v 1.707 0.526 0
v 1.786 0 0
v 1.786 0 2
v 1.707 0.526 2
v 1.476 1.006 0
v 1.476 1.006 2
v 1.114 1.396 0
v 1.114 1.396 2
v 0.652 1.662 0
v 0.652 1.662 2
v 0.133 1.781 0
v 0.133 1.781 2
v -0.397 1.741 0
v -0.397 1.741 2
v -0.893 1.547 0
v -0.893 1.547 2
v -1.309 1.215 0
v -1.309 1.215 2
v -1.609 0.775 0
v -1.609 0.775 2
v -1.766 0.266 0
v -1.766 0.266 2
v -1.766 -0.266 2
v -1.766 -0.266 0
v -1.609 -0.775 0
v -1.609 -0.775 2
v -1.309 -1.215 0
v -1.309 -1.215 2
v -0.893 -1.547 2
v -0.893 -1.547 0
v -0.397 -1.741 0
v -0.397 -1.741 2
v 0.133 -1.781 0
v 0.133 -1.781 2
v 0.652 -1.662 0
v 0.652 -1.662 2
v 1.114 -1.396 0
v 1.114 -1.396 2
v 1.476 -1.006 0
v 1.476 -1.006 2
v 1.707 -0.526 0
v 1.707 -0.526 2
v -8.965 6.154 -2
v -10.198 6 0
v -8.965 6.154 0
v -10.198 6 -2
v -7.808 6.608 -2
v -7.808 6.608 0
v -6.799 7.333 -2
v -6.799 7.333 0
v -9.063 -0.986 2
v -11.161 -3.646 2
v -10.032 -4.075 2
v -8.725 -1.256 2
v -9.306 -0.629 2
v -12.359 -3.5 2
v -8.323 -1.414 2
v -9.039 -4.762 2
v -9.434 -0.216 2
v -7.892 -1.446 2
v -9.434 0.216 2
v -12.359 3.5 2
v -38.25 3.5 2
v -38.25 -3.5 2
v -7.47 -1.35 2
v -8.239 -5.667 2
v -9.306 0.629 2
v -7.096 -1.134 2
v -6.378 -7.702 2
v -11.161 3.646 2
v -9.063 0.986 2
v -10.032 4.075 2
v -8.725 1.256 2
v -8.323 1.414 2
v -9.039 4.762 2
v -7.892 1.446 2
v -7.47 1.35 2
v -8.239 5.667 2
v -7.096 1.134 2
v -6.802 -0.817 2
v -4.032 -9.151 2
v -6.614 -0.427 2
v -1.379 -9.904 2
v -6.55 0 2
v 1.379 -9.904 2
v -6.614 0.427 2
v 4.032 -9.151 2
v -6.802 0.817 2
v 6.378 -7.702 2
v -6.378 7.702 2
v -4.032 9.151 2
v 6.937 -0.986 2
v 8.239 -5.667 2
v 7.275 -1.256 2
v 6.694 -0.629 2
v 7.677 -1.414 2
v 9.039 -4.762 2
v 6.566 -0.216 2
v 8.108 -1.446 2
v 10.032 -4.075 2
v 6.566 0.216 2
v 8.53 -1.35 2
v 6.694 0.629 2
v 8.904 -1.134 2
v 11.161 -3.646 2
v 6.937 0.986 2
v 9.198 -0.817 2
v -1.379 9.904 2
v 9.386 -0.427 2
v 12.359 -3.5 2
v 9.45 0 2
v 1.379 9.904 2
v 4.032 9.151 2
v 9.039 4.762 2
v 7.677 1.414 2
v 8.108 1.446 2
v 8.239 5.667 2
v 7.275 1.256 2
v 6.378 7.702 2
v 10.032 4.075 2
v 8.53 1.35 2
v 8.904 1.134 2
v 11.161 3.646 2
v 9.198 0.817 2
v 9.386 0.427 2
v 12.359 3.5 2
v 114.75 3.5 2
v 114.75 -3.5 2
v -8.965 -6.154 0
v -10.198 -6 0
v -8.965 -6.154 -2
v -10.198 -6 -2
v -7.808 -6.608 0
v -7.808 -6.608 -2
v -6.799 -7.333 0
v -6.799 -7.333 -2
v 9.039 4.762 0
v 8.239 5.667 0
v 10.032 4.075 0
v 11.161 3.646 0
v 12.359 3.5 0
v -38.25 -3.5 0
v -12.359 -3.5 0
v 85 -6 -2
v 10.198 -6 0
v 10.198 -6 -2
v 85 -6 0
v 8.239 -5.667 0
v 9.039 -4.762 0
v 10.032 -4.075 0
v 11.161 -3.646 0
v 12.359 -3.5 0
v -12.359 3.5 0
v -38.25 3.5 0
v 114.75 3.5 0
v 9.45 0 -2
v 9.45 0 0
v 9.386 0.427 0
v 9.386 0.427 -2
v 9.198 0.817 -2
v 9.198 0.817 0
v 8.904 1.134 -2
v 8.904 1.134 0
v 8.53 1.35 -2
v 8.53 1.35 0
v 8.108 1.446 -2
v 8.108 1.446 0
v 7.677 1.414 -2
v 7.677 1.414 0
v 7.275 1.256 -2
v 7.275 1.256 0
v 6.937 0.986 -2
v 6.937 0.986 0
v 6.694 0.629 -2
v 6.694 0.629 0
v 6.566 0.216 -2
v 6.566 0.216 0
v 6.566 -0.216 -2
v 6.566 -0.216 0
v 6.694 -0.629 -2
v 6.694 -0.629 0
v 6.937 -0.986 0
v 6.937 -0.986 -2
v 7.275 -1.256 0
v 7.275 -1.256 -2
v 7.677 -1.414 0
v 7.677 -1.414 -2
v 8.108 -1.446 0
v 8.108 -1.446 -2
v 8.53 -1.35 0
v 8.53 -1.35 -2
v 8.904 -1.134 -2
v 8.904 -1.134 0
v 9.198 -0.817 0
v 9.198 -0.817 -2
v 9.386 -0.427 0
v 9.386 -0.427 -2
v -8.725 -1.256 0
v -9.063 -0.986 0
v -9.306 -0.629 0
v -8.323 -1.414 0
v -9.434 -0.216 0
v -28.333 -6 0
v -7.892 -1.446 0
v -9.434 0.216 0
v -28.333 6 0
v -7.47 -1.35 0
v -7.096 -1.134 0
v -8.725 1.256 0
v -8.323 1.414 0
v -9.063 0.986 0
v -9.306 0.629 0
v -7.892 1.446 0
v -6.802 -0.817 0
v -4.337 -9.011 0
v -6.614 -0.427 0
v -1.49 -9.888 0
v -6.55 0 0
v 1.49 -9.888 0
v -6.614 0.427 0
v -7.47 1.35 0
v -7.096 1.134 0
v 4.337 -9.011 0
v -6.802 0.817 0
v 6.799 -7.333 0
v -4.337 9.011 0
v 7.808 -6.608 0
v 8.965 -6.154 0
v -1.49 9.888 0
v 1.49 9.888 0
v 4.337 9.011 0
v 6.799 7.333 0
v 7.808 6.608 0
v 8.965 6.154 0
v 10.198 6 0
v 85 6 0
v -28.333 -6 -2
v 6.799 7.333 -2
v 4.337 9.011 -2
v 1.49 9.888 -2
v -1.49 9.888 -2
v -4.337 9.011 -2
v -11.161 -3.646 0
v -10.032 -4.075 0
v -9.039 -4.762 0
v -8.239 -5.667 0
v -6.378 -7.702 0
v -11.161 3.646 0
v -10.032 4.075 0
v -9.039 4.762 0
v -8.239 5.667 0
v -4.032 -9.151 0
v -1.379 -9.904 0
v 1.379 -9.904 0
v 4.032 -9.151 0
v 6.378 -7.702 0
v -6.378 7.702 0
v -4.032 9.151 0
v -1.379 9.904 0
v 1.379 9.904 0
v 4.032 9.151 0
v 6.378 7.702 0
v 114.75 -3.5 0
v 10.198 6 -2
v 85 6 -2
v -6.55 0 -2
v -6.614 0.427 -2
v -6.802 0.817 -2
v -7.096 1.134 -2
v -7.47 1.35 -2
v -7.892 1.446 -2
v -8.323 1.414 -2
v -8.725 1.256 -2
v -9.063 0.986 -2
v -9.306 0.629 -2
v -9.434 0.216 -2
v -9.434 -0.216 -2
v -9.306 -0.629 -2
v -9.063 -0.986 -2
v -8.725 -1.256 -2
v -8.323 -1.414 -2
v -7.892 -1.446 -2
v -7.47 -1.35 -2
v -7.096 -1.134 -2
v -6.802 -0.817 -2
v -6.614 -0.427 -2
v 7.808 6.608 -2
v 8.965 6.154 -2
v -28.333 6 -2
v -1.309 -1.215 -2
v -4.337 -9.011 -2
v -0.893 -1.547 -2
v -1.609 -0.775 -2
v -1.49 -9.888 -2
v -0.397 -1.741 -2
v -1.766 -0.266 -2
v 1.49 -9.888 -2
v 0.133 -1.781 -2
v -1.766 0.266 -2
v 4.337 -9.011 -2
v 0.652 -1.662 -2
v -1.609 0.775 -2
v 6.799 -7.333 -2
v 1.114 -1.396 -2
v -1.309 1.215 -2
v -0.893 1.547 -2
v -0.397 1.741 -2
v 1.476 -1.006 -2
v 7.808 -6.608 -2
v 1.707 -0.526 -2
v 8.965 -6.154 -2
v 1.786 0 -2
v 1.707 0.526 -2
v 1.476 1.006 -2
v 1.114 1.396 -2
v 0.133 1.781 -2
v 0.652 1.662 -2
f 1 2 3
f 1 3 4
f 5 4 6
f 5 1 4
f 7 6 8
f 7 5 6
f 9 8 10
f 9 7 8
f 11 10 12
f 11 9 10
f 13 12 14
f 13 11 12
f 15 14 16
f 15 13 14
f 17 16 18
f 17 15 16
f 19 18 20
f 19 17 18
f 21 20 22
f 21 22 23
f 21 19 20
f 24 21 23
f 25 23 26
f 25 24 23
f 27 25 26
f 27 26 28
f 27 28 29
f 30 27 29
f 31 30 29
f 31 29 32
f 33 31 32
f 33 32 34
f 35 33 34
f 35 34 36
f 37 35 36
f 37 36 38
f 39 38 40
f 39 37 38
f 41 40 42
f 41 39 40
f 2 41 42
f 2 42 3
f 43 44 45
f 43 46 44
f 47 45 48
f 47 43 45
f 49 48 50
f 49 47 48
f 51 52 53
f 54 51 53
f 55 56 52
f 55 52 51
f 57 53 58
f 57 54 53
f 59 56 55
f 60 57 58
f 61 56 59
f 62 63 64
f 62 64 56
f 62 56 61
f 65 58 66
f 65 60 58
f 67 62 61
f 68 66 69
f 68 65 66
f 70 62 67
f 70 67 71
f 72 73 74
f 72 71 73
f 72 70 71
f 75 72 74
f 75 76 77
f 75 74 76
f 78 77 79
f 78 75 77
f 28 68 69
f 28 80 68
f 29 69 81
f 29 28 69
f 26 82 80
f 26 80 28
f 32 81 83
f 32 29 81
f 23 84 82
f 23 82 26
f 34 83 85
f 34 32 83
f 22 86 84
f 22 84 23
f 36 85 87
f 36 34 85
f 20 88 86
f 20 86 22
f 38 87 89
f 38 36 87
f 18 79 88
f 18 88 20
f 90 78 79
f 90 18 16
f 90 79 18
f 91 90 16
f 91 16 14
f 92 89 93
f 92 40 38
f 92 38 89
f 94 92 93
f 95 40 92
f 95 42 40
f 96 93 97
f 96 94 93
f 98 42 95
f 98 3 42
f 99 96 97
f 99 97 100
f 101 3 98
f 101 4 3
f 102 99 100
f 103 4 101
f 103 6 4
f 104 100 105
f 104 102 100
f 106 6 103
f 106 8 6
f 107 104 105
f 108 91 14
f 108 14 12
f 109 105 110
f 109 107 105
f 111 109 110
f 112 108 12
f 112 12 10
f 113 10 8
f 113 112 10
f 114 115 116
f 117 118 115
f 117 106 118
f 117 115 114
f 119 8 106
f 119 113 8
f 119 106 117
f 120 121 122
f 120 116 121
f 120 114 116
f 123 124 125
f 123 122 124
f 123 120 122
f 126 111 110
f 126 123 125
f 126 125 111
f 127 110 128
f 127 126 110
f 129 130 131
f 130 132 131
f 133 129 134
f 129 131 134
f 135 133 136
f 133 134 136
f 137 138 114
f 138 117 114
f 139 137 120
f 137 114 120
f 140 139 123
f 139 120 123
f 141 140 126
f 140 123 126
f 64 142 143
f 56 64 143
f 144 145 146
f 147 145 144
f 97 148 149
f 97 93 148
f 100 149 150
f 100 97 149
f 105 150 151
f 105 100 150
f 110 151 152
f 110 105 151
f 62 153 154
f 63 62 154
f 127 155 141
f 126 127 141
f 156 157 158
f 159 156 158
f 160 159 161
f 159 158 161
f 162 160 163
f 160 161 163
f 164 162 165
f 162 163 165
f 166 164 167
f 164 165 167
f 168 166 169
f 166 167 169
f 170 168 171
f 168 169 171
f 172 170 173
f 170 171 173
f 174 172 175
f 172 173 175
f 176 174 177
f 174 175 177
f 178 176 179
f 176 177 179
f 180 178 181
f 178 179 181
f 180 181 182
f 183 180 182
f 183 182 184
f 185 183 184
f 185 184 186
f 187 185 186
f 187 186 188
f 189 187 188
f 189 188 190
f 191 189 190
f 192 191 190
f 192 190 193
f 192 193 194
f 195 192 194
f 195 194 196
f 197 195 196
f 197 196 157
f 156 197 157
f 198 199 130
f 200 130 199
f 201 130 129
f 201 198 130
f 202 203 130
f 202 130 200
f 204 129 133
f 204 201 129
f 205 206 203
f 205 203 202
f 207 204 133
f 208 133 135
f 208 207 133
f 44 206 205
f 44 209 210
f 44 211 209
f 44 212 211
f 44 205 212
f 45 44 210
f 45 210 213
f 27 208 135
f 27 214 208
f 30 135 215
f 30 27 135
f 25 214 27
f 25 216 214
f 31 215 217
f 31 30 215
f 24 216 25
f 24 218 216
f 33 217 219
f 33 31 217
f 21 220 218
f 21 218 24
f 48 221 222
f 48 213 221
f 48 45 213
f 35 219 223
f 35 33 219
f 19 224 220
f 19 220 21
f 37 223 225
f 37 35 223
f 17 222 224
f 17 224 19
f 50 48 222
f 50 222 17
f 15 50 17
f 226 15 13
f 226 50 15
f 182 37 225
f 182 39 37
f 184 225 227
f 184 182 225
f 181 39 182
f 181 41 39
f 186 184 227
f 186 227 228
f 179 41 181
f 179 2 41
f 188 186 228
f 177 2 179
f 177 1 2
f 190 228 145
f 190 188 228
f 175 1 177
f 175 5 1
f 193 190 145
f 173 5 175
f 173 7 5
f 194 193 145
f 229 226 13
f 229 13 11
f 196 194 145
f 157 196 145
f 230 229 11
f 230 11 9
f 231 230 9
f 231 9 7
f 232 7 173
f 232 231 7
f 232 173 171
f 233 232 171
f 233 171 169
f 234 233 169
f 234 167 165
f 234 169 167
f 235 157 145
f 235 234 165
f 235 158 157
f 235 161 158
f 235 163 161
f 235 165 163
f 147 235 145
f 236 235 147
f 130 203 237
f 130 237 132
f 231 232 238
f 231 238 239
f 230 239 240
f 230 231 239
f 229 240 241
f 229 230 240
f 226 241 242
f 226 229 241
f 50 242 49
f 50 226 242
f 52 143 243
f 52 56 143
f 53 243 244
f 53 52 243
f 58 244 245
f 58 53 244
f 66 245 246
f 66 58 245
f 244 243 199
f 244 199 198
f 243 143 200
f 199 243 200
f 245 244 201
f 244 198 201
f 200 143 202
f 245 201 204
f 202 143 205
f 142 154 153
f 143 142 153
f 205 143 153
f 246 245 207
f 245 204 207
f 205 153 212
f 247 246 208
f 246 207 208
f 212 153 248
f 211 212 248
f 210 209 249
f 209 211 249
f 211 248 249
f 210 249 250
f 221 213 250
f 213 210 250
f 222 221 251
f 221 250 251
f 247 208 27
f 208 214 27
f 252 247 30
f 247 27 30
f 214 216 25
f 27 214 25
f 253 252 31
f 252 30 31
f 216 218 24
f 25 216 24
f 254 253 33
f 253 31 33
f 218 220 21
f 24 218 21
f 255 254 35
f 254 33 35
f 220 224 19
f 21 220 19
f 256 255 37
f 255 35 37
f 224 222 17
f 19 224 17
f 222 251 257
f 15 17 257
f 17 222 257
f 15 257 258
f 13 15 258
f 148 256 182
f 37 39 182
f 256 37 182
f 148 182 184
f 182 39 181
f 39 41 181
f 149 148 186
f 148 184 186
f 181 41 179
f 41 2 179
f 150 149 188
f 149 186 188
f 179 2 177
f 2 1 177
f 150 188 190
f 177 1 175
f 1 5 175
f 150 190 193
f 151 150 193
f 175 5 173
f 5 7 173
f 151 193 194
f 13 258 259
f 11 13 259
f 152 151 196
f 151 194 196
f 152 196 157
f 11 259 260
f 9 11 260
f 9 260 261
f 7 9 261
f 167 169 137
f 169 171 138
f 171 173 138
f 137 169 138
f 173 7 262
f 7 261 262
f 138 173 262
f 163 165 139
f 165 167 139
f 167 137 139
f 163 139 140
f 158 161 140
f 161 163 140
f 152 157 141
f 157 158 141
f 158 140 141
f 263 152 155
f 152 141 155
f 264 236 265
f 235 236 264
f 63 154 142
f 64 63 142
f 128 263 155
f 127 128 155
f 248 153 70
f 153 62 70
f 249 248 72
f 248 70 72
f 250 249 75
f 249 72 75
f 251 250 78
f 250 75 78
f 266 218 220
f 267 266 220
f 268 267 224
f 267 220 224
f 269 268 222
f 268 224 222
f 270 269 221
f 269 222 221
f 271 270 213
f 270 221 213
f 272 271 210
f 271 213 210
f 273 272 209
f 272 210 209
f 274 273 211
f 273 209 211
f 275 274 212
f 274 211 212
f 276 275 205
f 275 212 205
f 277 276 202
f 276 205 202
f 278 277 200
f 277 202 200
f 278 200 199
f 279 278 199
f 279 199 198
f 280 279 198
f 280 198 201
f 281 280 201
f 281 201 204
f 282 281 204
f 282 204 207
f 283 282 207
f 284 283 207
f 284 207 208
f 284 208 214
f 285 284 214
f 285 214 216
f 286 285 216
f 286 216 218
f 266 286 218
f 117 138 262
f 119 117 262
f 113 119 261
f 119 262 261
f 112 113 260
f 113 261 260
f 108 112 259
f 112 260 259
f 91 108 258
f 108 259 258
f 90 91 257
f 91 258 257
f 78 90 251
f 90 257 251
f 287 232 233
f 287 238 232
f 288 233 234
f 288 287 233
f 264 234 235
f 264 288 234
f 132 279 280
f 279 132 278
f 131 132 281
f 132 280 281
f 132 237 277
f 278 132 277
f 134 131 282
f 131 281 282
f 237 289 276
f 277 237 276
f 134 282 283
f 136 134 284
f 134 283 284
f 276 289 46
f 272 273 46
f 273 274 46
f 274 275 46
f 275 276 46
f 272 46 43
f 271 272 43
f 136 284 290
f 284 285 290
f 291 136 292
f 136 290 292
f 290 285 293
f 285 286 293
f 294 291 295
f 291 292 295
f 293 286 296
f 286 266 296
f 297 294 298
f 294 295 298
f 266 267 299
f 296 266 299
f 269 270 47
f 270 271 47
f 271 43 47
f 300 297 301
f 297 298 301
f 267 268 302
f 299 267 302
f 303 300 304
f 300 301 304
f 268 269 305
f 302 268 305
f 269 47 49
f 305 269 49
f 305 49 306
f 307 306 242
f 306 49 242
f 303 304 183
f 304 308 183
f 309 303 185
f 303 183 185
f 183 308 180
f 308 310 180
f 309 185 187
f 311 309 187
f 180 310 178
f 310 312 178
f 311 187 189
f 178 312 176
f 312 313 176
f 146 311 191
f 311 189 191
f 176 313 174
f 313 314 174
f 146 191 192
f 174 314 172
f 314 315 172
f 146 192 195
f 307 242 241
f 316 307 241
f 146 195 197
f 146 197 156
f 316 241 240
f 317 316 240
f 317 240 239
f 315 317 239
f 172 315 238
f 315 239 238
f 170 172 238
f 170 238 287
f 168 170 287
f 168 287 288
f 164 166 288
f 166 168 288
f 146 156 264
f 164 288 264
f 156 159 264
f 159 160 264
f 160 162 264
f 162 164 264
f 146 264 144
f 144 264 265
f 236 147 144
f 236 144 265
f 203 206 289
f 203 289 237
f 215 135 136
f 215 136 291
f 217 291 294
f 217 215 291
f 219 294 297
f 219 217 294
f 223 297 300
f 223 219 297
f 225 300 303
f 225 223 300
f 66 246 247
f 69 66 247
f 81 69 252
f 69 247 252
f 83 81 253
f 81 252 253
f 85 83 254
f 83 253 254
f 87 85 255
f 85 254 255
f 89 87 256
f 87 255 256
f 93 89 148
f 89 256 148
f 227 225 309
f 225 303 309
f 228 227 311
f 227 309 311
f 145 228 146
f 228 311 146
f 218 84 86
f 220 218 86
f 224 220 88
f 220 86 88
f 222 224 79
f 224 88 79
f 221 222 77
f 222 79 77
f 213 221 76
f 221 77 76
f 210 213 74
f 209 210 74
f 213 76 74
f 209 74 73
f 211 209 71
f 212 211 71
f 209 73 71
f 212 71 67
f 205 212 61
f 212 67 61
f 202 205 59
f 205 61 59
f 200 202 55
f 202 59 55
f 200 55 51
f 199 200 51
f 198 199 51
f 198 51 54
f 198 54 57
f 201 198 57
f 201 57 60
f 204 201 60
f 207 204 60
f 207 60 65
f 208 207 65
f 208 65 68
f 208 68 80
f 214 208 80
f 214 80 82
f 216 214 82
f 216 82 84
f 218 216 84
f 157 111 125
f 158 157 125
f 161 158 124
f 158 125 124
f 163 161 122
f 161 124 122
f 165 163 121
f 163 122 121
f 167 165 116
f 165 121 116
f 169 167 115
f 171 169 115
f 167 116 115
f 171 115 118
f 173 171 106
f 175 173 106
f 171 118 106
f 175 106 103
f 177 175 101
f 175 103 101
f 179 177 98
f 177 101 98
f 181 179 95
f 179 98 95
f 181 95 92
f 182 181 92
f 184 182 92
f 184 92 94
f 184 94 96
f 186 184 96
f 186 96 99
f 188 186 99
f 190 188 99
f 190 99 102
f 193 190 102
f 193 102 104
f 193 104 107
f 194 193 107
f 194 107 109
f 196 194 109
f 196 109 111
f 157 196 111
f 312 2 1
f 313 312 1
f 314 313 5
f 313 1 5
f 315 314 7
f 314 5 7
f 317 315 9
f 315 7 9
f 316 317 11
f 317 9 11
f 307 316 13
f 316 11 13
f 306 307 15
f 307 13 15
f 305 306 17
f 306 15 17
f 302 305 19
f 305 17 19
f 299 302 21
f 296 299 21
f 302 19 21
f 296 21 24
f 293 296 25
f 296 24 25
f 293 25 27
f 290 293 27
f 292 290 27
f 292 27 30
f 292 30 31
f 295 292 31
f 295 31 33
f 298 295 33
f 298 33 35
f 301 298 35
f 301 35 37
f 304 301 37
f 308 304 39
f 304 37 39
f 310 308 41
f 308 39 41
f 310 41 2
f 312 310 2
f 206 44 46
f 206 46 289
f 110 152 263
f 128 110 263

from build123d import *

# Parameters (mm, degrees)
F0_R     = 1.7859375
F1_DEPTH = 2
F2_R     = 1.7859375
F3_DEPTH = 2
F4_R     = 1.45
F5_DEPTH = 25
F6_R     = 5
F6_2_R   = 5


with BuildPart() as f1:
    # F0 (on Top) → F1 (new body)
    with BuildSketch(Plane.XY):
        with BuildLine():
            Line((-9.3674969976, 3.5), (-38.25, 3.5))
            Line((-38.25, 3.5), (-38.25, -3.5))
            Line((-38.25, -3.5), (-9.3674969976, -3.5))
            ThreePointArc((-9.3674969976, -3.5), (-10, 0), (-9.3674969976, 3.5))
        make_face()
        with BuildLine():
            ThreePointArc((9.3674969976, 3.5), (0, 10), (-9.3674969976, 3.5))
            Line((-9.3674969976, 3.5), (9.3674969976, 3.5))
        make_face()
        with BuildLine():
            Line((9.3674969976, 3.5), (-9.3674969976, 3.5))
            ThreePointArc((-9.3674969976, 3.5), (-10, 0), (-9.3674969976, -3.5))
            Line((-9.3674969976, -3.5), (9.3674969976, -3.5))
            ThreePointArc((9.3674969976, -3.5), (9.8406038935, -1.7783461452), (10, 0))
            ThreePointArc((10, 0), (9.8406038935, 1.7783461452), (9.3674969976, 3.5))
        make_face()
        Circle(F0_R, mode=Mode.SUBTRACT)
        with BuildLine():
            Line((114.75, 3.5), (9.3674969976, 3.5))
            ThreePointArc((9.3674969976, 3.5), (9.8406038935, 1.7783461452), (10, 0))
            ThreePointArc((10, 0), (9.8406038935, -1.7783461452), (9.3674969976, -3.5))
            Line((9.3674969976, -3.5), (114.75, -3.5))
            Line((114.75, -3.5), (114.75, 3.5))
        make_face()
        with BuildLine():
            Line((9.3674969976, -3.5), (-9.3674969976, -3.5))
            ThreePointArc((-9.3674969976, -3.5), (0, -10), (9.3674969976, -3.5))
        make_face()
    extrude(amount=F1_DEPTH)


with BuildPart() as f3:
    # F2 (on Top) → F3 (new body)
    with BuildSketch(Plane.XY):
        with BuildLine():
            Line((-8, 6), (-28.3333333333, 6))
            Line((-28.3333333333, 6), (-28.3333333333, -6))
            Line((-28.3333333333, -6), (-8, -6))
            ThreePointArc((-8, -6), (-10, 0), (-8, 6))
        make_face()
        with BuildLine():
            ThreePointArc((8, 6), (0, 10), (-8, 6))
            Line((-8, 6), (8, 6))
        make_face()
        with BuildLine():
            Line((8, 6), (-8, 6))
            ThreePointArc((-8, 6), (-10, 0), (-8, -6))
            Line((-8, -6), (8, -6))
            ThreePointArc((8, -6), (9.4868329805, -3.1622776602), (10, 0))
            ThreePointArc((10, 0), (9.4868329805, 3.1622776602), (8, 6))
        make_face()
        Circle(F2_R, mode=Mode.SUBTRACT)
        with BuildLine():
            Line((85, 6), (8, 6))
            ThreePointArc((8, 6), (9.4868329805, 3.1622776602), (10, 0))
            ThreePointArc((10, 0), (9.4868329805, -3.1622776602), (8, -6))
            Line((8, -6), (85, -6))
            Line((85, -6), (85, 6))
        make_face()
        with BuildLine():
            Line((8, -6), (-8, -6))
            ThreePointArc((-8, -6), (0, -10), (8, -6))
        make_face()
    extrude(amount=-F3_DEPTH)


with BuildPart() as f5_tool:
    # F4 (on face) → F5 (new body)
    with BuildSketch(Plane.XY.offset(2)):
        with Locations((8, 0)):
            Circle(F4_R)
        with Locations((-8, 0)):
            Circle(F4_R)
    extrude(amount=-F5_DEPTH)


with BuildPart() as f1_1:
    add(f1.part)

    # F5: cut by f5_tool
    add(f5_tool.part, mode=Mode.SUBTRACT)

    # F6
    f6_edges = [f1_1.edges().sort_by_distance(p)[0] for p in [
        (9.367497, -3.5, 1),
        (9.367497, 3.5, 1),
        (-9.367497, 3.5, 1),
        (-9.367497, -3.5, 1),
    ]]
    fillet(f6_edges, radius=F6_R)


with BuildPart() as f3_1:
    add(f3.part)

    # F5: cut by f5_tool
    add(f5_tool.part, mode=Mode.SUBTRACT)

    # F6#2
    f6_2_edges = [f3_1.edges().sort_by_distance(p)[0] for p in [
        (-8, -6, -1),
        (8, 6, -1),
        (8, -6, -1),
        (-8, 6, -1),
    ]]
    fillet(f6_2_edges, radius=F6_2_R)


solid = Compound([f1_1.part, f3_1.part])
